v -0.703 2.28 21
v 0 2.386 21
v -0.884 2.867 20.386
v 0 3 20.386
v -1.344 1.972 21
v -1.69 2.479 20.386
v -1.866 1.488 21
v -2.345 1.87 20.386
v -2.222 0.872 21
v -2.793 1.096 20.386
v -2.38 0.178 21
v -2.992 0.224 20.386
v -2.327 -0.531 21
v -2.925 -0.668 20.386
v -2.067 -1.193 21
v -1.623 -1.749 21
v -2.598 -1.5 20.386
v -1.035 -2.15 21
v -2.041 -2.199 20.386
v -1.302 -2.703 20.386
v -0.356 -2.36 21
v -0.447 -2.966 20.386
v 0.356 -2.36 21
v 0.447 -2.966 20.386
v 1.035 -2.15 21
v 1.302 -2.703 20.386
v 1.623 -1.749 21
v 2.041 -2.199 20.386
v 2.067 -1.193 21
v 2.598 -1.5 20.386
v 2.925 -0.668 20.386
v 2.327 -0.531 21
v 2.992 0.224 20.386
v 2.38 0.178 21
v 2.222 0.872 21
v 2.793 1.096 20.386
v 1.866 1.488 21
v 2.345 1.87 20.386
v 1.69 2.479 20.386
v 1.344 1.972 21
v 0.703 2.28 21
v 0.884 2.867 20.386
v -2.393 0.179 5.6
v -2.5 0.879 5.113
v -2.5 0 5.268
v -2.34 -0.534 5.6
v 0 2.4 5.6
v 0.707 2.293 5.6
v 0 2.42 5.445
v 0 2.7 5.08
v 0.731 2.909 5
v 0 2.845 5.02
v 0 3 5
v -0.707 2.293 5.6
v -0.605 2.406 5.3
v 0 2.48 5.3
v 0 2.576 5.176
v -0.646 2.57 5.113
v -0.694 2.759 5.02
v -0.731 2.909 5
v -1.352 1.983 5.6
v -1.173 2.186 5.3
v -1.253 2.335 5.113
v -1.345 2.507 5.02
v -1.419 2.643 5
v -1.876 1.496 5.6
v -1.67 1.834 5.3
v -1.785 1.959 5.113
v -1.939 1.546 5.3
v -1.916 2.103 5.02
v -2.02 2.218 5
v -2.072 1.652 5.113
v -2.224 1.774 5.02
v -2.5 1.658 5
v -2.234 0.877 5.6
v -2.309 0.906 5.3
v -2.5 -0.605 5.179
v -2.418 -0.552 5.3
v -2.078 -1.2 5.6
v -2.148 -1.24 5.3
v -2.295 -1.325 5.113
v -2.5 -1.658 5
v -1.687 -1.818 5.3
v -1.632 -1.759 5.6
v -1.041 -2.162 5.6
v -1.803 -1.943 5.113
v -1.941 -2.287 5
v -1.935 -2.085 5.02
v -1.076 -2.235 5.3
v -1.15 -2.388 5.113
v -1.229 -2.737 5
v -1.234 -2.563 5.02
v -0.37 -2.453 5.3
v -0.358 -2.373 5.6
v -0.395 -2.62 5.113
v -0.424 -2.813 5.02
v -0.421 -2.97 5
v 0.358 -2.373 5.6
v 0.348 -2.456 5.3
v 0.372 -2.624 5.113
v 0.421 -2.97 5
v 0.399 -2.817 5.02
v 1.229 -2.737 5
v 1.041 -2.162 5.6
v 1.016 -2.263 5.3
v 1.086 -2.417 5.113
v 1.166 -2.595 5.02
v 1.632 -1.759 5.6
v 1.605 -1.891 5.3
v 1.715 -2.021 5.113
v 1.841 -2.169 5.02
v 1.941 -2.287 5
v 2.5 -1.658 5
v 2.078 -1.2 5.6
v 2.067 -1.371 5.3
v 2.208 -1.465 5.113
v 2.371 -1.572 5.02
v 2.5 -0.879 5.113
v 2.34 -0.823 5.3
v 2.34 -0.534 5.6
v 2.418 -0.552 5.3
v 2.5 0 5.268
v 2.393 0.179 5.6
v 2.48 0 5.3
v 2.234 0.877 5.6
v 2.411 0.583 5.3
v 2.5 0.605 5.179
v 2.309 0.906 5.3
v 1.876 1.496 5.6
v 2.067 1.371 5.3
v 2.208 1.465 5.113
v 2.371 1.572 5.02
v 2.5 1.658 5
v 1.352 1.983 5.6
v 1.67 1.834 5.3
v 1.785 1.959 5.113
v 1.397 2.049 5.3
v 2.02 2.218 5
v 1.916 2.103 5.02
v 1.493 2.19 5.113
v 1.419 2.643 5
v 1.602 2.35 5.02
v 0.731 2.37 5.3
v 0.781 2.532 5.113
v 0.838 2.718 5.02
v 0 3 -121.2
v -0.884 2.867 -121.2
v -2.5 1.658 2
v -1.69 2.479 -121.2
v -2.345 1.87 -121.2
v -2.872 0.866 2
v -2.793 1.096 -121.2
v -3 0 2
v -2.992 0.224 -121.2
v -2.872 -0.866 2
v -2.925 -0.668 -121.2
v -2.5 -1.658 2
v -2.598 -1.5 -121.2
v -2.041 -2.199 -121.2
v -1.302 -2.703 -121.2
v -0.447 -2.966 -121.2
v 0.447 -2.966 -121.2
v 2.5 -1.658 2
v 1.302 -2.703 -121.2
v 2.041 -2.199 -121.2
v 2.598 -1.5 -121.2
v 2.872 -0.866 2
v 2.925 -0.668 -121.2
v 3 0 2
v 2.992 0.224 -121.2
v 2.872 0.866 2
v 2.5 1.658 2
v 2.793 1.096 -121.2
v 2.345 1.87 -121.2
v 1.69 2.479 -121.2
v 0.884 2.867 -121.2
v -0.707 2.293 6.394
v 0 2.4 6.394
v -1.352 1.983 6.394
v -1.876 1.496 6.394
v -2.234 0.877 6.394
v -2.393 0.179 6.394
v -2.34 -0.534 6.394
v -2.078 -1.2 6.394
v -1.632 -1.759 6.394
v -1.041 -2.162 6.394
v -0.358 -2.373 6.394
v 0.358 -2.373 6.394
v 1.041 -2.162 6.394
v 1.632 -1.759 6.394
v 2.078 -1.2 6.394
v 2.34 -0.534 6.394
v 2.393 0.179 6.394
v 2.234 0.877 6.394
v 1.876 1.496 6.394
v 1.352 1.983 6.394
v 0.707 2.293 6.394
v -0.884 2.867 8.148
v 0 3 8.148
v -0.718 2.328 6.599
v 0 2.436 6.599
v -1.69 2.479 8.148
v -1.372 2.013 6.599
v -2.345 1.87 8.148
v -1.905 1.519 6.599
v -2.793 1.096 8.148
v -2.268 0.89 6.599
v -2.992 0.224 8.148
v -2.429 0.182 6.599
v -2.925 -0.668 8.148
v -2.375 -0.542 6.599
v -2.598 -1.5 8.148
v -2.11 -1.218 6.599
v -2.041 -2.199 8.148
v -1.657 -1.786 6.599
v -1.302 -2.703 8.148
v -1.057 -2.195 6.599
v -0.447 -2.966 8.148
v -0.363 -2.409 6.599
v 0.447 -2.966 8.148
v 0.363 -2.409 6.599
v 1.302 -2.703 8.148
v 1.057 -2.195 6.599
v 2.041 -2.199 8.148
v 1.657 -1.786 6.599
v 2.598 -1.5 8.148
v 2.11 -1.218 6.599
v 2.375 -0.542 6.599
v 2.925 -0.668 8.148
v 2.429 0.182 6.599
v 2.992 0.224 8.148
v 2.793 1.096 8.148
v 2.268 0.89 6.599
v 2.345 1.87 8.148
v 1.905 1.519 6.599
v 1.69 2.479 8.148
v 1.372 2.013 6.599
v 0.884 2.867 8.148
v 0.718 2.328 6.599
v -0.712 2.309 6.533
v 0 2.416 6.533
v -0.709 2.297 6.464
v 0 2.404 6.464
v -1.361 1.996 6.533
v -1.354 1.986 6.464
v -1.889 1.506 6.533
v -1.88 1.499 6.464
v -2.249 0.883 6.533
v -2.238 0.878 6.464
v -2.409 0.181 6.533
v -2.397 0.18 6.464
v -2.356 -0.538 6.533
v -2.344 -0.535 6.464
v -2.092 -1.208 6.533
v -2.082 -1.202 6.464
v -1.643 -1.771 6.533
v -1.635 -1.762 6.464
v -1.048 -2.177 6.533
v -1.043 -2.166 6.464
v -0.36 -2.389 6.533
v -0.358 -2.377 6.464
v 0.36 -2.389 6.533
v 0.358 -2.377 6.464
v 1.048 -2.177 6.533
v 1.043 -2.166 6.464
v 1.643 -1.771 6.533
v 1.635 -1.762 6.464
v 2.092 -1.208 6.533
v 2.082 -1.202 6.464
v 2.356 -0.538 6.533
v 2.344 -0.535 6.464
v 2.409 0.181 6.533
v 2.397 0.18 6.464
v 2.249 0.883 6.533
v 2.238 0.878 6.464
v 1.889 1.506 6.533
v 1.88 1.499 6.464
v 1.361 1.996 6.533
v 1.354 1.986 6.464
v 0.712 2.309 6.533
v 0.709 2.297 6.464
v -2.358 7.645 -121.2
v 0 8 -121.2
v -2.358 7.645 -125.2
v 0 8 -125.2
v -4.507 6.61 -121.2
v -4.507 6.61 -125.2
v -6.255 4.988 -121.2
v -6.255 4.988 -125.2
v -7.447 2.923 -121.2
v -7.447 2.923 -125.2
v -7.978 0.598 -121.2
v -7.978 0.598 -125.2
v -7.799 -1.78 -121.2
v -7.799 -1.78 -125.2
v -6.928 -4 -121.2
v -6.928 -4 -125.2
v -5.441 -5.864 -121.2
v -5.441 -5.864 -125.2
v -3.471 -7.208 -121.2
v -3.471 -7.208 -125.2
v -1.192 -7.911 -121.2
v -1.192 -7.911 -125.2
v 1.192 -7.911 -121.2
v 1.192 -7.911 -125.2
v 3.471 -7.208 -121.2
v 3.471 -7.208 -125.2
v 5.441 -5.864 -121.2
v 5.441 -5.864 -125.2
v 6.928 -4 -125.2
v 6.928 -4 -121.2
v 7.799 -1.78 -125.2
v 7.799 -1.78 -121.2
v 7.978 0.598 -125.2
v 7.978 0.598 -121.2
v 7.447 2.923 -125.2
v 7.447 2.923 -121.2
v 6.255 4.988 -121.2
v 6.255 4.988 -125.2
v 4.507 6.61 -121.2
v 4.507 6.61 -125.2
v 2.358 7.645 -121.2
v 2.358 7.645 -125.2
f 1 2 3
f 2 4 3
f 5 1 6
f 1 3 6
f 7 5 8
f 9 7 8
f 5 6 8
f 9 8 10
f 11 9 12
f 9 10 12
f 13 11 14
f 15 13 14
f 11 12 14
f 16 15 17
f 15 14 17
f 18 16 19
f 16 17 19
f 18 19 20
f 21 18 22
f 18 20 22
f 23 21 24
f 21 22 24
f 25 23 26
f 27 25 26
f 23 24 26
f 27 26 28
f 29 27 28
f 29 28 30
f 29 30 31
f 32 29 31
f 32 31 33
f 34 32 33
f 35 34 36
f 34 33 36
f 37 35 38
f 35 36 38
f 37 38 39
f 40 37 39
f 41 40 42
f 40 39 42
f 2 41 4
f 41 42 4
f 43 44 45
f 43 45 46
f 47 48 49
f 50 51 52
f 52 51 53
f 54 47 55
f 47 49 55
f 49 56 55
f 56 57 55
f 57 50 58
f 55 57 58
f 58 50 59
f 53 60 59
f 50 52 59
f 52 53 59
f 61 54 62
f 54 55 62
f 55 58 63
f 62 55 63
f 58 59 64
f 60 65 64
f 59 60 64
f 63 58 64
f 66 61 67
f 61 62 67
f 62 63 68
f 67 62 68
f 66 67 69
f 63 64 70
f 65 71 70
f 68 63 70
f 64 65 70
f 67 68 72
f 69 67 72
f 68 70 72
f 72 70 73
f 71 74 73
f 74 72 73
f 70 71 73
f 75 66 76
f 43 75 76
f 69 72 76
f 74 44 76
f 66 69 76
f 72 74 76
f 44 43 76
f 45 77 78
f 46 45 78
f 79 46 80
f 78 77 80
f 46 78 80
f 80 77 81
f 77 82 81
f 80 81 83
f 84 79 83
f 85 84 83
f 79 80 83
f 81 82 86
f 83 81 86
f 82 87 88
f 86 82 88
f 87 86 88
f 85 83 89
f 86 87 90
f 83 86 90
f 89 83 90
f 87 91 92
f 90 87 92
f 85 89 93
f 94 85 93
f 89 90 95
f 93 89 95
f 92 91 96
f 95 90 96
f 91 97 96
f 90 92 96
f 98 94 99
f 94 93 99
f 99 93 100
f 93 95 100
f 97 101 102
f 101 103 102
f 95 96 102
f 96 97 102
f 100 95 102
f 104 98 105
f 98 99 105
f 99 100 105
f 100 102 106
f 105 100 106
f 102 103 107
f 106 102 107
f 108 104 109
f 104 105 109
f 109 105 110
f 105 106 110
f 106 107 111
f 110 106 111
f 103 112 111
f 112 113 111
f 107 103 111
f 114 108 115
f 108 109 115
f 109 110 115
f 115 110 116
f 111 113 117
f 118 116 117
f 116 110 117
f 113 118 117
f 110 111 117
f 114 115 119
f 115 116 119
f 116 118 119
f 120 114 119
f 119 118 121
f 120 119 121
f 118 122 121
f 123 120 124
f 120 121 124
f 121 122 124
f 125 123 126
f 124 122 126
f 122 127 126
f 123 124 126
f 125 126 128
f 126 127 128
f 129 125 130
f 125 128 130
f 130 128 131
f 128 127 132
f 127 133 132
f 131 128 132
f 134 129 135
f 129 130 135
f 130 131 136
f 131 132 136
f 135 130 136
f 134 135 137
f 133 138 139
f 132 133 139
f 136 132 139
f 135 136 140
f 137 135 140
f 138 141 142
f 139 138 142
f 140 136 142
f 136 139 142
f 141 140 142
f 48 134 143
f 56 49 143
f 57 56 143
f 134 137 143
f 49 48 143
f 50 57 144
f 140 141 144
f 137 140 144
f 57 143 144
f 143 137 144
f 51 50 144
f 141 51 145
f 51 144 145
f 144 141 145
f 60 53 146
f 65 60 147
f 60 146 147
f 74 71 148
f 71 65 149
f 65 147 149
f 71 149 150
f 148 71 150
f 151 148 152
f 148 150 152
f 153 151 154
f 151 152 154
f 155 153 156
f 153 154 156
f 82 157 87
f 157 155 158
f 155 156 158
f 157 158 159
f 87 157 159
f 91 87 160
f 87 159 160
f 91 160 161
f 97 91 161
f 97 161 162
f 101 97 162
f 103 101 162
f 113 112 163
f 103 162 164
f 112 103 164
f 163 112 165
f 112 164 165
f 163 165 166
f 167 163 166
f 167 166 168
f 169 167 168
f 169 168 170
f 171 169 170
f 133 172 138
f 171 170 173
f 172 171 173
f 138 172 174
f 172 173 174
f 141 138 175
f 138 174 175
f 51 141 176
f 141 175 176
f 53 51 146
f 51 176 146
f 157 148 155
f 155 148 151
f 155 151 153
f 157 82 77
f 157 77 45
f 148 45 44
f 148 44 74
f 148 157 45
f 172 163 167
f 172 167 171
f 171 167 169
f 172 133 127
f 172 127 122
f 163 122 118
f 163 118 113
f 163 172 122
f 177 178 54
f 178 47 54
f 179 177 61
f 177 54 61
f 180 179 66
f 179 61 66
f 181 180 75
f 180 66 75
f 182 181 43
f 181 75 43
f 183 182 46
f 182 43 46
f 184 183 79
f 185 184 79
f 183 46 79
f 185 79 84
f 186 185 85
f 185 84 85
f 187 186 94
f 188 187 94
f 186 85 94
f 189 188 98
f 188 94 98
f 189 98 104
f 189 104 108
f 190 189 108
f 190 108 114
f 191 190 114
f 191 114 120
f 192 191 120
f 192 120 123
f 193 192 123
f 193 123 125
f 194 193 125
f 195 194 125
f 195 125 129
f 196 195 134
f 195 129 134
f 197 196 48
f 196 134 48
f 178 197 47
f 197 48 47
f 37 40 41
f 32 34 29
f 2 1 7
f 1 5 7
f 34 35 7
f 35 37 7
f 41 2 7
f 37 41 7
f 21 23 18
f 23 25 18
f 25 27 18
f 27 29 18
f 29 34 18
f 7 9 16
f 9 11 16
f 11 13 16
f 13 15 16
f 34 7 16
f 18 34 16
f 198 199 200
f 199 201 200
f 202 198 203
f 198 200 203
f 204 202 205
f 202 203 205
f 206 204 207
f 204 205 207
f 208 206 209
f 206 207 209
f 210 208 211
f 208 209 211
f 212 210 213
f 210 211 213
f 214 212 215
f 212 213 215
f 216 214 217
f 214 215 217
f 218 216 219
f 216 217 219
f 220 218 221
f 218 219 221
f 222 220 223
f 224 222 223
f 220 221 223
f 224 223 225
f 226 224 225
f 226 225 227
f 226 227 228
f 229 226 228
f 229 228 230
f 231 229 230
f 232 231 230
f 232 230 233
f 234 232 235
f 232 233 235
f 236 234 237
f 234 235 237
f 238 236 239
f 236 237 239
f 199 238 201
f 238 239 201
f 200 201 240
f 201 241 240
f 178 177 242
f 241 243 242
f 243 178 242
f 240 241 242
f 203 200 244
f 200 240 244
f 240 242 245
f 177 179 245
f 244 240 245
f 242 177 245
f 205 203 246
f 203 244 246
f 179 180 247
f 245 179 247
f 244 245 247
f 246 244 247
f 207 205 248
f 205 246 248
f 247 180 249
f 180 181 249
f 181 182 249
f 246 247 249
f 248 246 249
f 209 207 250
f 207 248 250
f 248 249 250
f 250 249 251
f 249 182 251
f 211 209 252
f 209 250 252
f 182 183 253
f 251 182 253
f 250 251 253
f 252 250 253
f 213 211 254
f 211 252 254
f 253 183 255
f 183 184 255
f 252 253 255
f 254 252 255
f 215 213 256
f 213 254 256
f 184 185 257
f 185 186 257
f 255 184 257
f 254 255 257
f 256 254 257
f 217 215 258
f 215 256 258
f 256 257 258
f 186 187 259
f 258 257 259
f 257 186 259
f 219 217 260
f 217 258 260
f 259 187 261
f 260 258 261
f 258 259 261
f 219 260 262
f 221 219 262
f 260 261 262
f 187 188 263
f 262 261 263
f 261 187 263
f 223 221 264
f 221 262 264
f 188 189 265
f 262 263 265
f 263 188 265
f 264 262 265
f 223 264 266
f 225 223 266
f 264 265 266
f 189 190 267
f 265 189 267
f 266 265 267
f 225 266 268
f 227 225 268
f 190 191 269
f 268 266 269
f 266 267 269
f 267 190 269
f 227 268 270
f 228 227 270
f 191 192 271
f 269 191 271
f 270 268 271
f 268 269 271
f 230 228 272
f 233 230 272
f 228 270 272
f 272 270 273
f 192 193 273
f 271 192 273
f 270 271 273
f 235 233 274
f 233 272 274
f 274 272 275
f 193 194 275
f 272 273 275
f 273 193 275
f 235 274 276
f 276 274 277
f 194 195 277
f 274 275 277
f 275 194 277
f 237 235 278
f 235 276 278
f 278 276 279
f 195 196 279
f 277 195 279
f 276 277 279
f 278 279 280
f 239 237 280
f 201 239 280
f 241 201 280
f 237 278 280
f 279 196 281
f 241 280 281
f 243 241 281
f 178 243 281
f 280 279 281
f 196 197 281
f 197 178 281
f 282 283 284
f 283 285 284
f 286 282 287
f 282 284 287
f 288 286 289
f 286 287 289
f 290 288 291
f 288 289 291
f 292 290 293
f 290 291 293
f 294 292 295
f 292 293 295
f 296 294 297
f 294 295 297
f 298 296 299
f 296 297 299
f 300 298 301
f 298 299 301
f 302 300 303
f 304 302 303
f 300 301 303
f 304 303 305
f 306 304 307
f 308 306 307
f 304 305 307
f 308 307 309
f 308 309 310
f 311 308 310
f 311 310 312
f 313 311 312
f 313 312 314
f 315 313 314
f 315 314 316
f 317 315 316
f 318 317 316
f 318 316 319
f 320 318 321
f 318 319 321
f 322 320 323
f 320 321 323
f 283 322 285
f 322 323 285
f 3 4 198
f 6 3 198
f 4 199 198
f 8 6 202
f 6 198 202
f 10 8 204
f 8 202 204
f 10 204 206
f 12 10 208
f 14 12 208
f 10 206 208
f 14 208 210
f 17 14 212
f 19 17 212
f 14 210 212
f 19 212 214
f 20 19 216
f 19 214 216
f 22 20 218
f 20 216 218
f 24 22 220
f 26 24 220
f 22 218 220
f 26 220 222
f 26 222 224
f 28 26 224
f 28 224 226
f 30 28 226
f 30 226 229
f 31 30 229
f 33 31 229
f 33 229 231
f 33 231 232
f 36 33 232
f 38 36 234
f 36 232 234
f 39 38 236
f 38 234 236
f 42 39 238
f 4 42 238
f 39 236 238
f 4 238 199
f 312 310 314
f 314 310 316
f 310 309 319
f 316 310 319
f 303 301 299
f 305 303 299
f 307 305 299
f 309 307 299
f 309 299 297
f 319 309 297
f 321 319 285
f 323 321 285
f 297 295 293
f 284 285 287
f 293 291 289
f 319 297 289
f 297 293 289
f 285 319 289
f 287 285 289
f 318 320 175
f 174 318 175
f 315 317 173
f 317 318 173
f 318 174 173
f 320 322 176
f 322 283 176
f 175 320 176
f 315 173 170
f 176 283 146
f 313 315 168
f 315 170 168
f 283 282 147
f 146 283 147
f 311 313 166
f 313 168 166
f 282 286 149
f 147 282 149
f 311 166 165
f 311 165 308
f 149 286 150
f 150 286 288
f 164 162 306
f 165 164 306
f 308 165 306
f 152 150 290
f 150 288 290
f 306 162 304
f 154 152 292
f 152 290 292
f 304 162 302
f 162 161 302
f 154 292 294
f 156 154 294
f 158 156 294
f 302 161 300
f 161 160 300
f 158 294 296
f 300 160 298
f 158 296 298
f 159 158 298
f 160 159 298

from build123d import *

# Parameters (mm, degrees)
CUT_EXTRUDE1_DEPTH = 4


with BuildPart() as part:
    # Sketch1 → Revolve1 (revolve)
    with BuildSketch(Plane(origin=(0, 0, 0), x_dir=(0, 0, -1), z_dir=(1, 0, 0))):
        Polygon((-5, 0), (-5, 3), (121.2, 3), (121.2, 8), (125.2, 8), (125.2, 0), align=None)
    revolve(axis=Axis((0, 0, -125.2), (0, 0, 1)))

    # Sketch2 → Revolve2 (revolve)
    with BuildSketch(Plane(origin=(0, 0, 0), x_dir=(0, 0, -1), z_dir=(1, 0, 0))):
        with BuildLine():
            Line((-21, 0), (-21, 2.3865))
            Line((-21, 2.3865), (-20.3865, 3))
            Line((-20.3865, 3), (-8.148486452, 3))
            Line((-8.148486452, 3), (-6.599415898, 2.436184428))
            ThreePointArc((-6.599415898, 2.436184428), (-6.498392718, 2.409115348), (-6.394203812, 2.4))
            Line((-6.394203812, 2.4), (-5.6, 2.4))
            ThreePointArc((-5.6, 2.4), (-5.175735931, 2.575735931), (-5, 3))
            Line((-5, 3), (-4, 3))
            Line((-4, 3), (-4, 0))
            Line((-4, 0), (-21, 0))
        make_face()
    revolve(axis=Axis((0, 0, 4), (0, 0, 1)))

    # Sketch3 → Cut-Extrude1 (cut)
    with BuildSketch(Plane.XY.offset(2)):
        Polygon((-5, 10), (-5, -5), (-2.5, -5), (-2.5, 5), (2.5, 5), (2.5, -5), (5, -5), (5, 10), align=None)
    extrude(amount=CUT_EXTRUDE1_DEPTH, mode=Mode.SUBTRACT)


solid = part.part
